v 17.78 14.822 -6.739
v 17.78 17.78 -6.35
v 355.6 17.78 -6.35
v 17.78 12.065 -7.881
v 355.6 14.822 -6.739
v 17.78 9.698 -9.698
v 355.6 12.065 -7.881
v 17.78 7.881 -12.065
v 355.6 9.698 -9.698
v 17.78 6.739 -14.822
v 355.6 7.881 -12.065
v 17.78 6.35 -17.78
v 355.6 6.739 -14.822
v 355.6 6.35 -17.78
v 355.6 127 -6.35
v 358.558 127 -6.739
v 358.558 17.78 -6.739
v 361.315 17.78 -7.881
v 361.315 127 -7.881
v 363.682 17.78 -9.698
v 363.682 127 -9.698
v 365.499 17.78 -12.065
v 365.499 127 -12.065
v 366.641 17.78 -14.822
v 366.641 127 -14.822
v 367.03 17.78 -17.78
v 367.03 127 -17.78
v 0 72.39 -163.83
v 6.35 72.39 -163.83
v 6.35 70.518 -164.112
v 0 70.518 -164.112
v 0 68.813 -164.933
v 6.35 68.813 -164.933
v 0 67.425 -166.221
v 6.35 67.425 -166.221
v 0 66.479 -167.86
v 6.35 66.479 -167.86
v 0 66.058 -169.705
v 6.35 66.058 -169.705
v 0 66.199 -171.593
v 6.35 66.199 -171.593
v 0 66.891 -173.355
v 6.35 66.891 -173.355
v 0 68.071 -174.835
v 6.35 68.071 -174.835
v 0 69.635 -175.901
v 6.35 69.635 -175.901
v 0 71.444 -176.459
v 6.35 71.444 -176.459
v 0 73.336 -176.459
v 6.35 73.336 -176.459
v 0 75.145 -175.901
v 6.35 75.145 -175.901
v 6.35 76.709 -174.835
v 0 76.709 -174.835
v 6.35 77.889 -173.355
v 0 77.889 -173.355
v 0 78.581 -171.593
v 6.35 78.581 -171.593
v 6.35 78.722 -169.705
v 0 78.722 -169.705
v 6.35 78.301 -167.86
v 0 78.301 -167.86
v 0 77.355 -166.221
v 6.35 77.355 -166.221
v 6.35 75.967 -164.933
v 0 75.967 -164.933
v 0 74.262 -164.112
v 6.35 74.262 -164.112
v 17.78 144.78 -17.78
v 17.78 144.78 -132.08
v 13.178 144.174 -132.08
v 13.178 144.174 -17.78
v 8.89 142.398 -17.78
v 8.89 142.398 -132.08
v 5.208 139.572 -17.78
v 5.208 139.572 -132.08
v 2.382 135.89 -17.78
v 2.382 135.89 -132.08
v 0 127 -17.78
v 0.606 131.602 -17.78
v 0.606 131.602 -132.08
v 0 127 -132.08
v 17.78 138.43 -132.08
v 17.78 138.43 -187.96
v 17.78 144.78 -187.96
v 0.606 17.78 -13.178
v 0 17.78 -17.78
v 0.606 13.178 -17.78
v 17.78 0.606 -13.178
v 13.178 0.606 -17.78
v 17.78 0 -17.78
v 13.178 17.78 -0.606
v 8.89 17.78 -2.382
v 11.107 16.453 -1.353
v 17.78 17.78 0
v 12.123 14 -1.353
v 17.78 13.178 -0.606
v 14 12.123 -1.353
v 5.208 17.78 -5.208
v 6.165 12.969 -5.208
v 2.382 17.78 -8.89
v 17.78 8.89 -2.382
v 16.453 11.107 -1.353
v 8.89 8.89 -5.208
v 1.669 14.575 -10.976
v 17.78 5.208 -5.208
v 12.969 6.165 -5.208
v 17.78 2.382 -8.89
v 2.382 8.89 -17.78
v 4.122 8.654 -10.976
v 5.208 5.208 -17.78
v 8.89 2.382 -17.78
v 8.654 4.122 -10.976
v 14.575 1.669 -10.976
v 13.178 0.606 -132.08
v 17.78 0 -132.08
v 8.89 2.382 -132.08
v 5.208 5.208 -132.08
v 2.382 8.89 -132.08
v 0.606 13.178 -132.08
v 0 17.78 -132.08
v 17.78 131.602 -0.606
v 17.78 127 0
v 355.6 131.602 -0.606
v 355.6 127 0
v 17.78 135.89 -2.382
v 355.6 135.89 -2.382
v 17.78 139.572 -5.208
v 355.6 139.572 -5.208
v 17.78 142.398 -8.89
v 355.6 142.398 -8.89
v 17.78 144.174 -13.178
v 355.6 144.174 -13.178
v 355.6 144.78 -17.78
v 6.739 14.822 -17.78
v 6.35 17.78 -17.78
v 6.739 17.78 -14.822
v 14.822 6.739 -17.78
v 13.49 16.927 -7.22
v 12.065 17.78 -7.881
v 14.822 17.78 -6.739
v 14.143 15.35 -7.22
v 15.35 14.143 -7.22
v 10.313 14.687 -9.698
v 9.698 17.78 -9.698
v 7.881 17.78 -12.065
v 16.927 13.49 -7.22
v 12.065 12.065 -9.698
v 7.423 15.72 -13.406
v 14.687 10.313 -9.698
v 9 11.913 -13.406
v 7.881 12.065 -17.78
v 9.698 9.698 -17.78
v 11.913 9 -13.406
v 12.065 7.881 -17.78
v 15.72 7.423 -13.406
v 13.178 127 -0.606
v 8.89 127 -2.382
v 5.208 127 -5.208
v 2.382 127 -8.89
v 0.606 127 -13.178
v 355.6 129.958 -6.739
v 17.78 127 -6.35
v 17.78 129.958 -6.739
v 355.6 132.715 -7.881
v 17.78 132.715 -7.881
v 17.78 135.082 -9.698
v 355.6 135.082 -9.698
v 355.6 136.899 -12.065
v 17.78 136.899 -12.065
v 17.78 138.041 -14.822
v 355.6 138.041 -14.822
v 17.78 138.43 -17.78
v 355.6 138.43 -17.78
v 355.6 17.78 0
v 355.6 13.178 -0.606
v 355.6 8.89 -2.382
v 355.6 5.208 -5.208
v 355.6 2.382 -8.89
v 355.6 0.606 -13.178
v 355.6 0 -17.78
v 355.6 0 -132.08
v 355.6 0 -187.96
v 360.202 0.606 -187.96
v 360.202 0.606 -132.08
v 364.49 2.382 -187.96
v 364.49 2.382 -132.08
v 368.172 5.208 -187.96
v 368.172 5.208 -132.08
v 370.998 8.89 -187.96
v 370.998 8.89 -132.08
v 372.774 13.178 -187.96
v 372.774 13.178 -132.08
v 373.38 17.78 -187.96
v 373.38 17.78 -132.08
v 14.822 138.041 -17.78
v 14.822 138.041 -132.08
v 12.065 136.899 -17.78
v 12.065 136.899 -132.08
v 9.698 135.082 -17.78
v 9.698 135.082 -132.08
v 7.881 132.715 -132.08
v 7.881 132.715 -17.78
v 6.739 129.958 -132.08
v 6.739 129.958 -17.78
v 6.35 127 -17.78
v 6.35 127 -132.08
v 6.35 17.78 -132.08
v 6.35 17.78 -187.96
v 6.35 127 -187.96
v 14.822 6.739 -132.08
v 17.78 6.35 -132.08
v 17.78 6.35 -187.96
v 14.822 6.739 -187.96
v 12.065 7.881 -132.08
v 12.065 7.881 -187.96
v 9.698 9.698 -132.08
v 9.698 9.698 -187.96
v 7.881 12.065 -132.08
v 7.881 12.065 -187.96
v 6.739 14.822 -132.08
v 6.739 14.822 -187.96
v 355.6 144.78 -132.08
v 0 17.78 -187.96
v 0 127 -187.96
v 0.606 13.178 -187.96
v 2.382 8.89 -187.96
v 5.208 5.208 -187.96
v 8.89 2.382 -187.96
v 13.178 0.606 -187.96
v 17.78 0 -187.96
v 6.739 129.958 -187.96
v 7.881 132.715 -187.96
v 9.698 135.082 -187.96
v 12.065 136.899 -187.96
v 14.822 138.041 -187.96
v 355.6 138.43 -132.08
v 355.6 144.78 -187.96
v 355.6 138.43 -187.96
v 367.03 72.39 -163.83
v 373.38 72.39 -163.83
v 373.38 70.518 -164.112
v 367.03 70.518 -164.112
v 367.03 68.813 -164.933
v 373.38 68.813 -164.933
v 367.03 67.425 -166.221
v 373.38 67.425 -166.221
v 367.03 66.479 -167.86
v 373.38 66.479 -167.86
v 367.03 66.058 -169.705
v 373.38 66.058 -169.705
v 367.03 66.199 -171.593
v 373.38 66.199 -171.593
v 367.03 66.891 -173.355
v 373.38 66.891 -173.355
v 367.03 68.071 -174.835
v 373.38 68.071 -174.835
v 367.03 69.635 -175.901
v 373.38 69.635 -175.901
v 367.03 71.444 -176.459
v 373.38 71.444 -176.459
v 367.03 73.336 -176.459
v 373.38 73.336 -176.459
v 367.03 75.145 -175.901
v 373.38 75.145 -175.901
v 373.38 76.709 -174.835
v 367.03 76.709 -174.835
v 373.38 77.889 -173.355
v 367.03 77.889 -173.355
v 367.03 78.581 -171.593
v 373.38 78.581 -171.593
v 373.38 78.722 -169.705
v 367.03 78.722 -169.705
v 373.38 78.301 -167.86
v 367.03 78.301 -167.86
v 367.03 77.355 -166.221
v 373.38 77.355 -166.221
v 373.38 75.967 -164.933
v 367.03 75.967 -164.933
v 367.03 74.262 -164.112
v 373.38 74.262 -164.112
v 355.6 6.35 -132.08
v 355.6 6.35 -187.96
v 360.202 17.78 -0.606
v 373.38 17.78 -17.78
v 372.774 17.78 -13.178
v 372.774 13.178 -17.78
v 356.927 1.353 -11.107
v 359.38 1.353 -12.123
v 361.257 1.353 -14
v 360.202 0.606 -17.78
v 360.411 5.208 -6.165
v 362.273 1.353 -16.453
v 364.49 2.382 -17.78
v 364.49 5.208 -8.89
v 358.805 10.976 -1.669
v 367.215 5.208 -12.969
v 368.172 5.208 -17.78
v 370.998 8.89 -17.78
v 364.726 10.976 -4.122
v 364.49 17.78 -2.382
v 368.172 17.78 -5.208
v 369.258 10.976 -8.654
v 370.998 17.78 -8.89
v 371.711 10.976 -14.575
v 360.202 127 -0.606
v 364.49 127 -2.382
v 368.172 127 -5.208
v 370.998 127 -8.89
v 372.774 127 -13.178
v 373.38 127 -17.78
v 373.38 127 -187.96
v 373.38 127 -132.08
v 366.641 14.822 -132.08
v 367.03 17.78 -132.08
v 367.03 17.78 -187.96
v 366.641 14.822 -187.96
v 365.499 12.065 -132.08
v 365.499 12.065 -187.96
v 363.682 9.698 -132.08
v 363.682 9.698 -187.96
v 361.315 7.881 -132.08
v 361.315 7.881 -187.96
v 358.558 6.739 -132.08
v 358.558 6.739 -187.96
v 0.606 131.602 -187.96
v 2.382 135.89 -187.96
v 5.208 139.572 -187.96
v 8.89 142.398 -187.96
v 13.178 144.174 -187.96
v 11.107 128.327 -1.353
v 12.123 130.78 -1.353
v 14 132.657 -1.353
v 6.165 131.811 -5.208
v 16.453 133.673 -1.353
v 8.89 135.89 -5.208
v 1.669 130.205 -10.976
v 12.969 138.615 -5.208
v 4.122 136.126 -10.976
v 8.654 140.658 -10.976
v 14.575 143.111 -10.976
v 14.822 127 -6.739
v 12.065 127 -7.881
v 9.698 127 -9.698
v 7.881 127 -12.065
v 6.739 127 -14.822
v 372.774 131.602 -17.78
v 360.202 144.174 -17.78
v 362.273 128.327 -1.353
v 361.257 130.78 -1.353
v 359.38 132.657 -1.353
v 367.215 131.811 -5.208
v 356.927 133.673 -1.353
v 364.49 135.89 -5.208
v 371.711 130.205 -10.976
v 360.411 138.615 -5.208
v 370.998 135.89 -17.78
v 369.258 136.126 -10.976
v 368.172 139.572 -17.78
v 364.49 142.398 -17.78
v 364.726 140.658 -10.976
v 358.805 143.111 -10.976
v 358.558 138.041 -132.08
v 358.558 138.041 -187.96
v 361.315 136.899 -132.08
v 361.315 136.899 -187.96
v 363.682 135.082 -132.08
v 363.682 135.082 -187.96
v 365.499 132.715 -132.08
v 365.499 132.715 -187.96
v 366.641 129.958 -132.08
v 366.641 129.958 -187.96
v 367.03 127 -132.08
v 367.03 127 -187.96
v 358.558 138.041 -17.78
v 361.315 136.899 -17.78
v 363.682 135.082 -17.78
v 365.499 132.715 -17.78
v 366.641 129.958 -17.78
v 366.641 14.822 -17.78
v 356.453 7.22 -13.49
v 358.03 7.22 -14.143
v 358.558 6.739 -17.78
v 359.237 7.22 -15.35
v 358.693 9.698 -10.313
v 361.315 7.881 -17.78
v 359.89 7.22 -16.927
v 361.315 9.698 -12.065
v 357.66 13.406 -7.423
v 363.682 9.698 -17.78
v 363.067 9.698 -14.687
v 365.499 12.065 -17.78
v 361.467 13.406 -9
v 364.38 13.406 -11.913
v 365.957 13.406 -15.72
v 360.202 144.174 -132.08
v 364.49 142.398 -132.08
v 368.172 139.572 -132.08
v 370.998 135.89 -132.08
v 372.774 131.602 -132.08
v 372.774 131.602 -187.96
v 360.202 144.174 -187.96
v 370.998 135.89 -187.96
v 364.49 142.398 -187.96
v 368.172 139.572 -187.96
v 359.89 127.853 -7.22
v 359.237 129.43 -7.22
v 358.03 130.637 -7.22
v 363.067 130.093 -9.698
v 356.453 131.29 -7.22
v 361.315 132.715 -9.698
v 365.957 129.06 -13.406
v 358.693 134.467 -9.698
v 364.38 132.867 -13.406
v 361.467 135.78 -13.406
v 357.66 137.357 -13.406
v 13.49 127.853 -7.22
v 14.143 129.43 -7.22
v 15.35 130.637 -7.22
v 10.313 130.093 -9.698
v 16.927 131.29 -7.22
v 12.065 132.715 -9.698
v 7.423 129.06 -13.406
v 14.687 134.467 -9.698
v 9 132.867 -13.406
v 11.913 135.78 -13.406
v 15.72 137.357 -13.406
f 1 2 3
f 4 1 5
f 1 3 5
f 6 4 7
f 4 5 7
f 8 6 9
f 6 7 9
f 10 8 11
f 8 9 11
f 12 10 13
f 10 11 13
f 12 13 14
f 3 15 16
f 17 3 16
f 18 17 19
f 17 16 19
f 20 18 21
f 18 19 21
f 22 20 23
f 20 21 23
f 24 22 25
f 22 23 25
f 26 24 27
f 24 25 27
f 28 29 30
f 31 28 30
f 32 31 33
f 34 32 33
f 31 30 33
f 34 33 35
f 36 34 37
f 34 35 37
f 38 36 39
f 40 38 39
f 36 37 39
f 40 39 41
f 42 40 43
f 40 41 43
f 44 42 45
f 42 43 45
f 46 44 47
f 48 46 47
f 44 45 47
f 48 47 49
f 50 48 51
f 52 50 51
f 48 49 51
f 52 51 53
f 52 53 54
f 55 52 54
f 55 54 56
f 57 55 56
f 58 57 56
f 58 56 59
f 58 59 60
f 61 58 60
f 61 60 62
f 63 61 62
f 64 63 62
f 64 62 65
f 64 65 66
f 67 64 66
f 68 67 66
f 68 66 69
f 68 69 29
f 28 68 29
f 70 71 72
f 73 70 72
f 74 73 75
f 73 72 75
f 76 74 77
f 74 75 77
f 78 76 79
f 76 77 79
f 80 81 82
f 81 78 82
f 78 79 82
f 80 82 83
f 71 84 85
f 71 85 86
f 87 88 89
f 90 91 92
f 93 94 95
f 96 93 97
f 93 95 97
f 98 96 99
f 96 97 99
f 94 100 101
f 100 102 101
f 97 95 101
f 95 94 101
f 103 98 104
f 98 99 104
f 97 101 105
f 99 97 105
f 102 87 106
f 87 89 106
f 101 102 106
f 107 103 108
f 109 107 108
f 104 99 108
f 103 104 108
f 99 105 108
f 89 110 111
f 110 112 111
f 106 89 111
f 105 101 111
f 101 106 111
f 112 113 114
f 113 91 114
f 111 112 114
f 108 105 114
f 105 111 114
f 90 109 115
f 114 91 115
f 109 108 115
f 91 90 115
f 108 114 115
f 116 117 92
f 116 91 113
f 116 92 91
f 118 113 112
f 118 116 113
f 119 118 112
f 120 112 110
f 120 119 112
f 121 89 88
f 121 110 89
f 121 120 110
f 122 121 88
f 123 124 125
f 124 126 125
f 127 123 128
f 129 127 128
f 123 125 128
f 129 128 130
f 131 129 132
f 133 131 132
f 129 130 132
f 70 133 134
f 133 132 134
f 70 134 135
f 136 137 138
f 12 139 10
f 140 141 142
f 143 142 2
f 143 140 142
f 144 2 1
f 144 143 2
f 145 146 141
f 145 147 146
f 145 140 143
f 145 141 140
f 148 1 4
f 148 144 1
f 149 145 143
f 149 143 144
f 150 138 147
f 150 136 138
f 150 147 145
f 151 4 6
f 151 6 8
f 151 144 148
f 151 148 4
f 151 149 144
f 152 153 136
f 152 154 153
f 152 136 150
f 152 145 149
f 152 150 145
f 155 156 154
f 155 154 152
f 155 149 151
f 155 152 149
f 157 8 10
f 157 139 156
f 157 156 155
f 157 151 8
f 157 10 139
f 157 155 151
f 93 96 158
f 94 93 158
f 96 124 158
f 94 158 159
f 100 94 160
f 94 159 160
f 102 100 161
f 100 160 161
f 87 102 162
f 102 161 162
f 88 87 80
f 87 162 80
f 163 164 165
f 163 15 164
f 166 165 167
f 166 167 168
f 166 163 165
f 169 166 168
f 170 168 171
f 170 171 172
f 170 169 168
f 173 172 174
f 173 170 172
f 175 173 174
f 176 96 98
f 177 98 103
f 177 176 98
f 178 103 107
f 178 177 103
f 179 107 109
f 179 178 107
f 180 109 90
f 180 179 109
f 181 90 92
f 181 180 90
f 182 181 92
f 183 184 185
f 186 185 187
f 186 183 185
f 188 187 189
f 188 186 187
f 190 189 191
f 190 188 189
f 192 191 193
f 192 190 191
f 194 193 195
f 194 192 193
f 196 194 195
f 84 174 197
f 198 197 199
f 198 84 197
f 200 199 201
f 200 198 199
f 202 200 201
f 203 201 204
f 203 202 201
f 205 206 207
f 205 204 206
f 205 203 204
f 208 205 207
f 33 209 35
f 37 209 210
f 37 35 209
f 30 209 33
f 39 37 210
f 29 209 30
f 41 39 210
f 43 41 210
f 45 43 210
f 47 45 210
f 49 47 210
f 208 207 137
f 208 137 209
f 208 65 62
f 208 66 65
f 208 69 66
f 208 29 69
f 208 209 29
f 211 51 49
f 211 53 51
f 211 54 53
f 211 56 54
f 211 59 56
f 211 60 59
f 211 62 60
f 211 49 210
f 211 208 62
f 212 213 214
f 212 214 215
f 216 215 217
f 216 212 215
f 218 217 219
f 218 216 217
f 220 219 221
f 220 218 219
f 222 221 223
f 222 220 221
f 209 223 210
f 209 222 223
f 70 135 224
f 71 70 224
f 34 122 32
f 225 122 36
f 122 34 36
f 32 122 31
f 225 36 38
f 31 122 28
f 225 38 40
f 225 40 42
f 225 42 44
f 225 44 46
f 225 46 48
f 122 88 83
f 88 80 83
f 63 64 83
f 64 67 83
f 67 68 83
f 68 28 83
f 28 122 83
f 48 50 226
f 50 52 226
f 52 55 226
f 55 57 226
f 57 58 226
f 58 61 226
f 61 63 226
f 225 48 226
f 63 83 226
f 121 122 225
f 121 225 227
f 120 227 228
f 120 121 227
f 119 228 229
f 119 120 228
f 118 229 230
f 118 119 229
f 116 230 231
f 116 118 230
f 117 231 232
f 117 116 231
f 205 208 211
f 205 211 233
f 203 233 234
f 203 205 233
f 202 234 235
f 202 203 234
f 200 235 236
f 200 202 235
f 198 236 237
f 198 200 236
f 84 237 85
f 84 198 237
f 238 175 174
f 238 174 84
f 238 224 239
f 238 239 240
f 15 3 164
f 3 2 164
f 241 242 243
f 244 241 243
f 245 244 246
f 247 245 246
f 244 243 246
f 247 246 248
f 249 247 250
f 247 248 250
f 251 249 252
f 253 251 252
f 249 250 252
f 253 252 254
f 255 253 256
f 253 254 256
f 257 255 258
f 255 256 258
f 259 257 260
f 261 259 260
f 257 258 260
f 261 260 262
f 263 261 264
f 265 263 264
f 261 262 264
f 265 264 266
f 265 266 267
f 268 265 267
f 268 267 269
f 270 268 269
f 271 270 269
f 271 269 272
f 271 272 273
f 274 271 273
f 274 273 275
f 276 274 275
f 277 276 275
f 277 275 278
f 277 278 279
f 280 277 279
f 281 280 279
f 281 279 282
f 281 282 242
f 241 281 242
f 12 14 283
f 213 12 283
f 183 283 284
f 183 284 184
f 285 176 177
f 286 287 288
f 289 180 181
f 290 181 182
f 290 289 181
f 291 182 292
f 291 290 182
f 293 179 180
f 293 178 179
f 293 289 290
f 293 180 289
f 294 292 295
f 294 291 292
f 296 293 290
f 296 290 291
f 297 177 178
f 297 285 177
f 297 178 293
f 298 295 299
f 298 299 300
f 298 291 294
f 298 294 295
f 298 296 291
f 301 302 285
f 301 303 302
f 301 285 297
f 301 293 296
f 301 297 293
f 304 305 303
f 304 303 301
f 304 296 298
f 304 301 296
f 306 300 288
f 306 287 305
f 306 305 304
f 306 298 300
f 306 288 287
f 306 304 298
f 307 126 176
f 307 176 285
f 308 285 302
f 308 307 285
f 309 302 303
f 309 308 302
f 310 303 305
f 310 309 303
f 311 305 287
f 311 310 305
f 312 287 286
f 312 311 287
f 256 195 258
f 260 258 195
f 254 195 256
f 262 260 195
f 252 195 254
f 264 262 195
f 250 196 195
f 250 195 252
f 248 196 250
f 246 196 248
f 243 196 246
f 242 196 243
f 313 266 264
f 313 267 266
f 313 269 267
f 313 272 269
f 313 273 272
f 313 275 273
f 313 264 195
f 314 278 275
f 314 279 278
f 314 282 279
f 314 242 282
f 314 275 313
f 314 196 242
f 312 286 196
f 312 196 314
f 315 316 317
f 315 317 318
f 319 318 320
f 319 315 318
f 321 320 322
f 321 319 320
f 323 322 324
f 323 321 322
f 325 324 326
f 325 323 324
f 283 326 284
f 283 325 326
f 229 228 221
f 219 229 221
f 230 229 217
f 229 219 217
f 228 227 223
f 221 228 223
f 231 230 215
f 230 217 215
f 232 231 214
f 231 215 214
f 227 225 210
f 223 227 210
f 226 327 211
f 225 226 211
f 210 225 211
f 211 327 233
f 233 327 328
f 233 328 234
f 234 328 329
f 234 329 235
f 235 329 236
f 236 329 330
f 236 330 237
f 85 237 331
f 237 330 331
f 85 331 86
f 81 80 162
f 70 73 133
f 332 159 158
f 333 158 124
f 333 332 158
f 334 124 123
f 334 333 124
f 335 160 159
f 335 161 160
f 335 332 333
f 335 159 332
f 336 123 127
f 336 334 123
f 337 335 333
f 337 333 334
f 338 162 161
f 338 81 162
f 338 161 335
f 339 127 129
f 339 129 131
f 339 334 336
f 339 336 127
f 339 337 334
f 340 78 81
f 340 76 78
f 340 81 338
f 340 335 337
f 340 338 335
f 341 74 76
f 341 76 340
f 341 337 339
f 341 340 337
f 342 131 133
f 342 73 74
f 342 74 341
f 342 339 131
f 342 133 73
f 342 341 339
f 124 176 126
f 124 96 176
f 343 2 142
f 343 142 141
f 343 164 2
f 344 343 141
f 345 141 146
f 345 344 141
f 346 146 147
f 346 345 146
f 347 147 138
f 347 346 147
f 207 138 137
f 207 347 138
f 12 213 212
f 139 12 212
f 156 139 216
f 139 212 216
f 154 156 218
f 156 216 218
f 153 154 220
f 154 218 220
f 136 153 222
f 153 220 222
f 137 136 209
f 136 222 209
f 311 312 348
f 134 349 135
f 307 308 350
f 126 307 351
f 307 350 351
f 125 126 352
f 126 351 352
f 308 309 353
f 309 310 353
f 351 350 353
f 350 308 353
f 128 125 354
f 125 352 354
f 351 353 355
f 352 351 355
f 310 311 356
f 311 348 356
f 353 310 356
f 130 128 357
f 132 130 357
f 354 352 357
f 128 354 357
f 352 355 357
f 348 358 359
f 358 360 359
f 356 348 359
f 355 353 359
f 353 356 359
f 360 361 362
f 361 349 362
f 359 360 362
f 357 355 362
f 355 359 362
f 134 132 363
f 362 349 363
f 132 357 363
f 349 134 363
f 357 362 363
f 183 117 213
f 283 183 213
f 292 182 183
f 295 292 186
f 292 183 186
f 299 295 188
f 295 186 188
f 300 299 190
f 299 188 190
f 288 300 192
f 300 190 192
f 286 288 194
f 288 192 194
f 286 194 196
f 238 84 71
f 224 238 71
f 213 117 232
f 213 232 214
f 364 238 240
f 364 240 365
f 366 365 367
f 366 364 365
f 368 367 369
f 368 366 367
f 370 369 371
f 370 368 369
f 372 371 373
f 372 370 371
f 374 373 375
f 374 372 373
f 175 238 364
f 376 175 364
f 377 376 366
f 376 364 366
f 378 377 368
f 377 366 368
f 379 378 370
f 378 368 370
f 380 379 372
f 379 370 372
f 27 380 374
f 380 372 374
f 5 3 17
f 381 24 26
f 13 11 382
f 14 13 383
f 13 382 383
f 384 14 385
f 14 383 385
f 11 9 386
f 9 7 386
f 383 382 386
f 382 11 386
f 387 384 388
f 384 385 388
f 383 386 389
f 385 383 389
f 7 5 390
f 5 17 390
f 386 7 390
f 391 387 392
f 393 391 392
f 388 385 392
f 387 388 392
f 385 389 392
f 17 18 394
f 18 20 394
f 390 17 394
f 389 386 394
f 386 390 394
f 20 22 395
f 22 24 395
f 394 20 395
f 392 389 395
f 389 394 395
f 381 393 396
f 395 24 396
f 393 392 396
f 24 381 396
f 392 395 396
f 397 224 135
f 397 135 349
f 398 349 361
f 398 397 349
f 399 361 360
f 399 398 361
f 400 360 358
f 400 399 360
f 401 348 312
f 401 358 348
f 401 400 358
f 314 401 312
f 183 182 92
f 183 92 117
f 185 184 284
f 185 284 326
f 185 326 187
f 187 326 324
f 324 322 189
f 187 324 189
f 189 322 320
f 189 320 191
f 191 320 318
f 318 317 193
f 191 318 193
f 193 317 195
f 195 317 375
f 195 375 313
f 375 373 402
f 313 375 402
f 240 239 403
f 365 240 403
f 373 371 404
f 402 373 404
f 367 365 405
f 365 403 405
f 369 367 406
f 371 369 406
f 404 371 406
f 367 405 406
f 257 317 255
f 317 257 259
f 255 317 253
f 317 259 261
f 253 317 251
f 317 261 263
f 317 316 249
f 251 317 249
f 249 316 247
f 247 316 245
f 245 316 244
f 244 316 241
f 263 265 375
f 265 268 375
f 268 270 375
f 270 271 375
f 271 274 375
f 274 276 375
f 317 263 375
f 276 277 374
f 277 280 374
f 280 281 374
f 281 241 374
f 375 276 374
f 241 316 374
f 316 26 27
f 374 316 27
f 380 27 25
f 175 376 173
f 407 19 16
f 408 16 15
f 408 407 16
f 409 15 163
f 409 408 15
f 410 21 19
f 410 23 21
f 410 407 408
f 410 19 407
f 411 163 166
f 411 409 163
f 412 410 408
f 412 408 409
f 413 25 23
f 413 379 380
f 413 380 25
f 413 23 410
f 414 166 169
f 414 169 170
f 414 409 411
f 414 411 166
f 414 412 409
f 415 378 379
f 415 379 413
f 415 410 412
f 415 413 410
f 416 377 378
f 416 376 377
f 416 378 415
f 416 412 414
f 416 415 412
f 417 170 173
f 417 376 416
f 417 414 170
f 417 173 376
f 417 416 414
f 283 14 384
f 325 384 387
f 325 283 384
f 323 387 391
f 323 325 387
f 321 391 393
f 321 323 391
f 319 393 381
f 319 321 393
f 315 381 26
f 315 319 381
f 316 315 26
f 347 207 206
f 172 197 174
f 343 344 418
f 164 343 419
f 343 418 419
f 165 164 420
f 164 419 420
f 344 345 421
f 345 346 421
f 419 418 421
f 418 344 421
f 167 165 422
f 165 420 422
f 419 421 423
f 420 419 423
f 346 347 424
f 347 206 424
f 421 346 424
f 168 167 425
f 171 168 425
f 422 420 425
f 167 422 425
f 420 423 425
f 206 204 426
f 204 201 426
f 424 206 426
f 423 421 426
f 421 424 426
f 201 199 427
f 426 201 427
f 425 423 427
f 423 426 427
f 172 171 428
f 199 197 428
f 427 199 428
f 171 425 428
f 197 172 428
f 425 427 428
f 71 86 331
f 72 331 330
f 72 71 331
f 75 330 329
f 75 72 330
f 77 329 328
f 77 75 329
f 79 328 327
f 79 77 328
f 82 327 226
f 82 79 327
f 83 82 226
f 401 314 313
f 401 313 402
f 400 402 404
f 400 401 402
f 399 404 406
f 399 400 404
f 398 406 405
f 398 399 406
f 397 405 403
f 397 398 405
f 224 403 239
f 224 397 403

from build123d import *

# Parameters (mm, degrees)
SKETCH1_W           = 132.08
SKETCH1_H           = 144.78
BOSS_EXTRUDE1_DEPTH = 373.38
FILLET1_R           = 17.78
SHELL1_T            = -6.35
SKETCH2_W           = 6.35
SKETCH2_H           = 109.22
BOSS_EXTRUDE2_DEPTH = 55.88
SKETCH3_R           = 6.35
CUT_EXTRUDE1_DEPTH  = 383.54


with BuildPart() as part:
    # Sketch1 → Boss-Extrude1 (new body)
    with BuildSketch(Plane(origin=(0, 0, 0), x_dir=(0, 0, -1), z_dir=(1, 0, 0))):
        with Locations((66.04, 72.39)):
            Rectangle(SKETCH1_W, SKETCH1_H)
    extrude(amount=BOSS_EXTRUDE1_DEPTH)

    # Fillet1
    fillet1_edges = [part.edges().sort_by_distance(p)[0] for p in [
        (373.38, 144.78, -66.04),
        (373.38, 72.39, 0),
        (0, 144.78, -66.04),
        (0, 0, -66.04),
        (0, 72.39, 0),
        (186.69, 144.78, 0),
        (186.69, 0, 0),
        (373.38, 0, -66.04),
    ]]
    fillet(fillet1_edges, radius=FILLET1_R)

    # Shell1
    shell1_openings = [part.faces().sort_by_distance(p)[0] for p in [
        (186.69, 72.39, -132.08),
    ]]
    offset(amount=SHELL1_T, openings=shell1_openings, kind=Kind.INTERSECTION)

    # Sketch2 → Boss-Extrude2 (add)
    with BuildSketch(Plane(origin=(0, 0, -132.08), x_dir=(-1, 0, 0), z_dir=(0, 0, -1))):
        with BuildLine():
            Line((-355.6, 144.78), (-355.6, 138.43))
            ThreePointArc((-355.6, 138.43), (-363.682230509, 135.082230509), (-367.03, 127))
            Line((-367.03, 127), (-373.38, 127))
            ThreePointArc((-373.38, 127), (-368.172358569, 139.572358569), (-355.6, 144.78))
        make_face()
        with Locations((-370.205, 72.39)):
            Rectangle(SKETCH2_W, SKETCH2_H)
        with BuildLine():
            Line((-355.6, 6.35), (-355.6, 0))
            ThreePointArc((-355.6, 0), (-368.172358569, 5.207641431), (-373.38, 17.78))
            Line((-373.38, 17.78), (-367.03, 17.78))
            ThreePointArc((-367.03, 17.78), (-363.682230509, 9.697769491), (-355.6, 6.35))
        make_face()
        with BuildLine():
            Line((-17.78, 138.43), (-17.78, 144.78))
            ThreePointArc((-17.78, 144.78), (-5.207641431, 139.572358569), (0, 127))
            Line((0, 127), (-6.35, 127))
            ThreePointArc((-6.35, 127), (-9.697769491, 135.082230509), (-17.78, 138.43))
        make_face()
        with Locations((-3.175, 72.39)):
            Rectangle(SKETCH2_W, SKETCH2_H)
        with BuildLine():
            Line((-6.35, 17.78), (0, 17.78))
            ThreePointArc((0, 17.78), (-5.207641431, 5.207641431), (-17.78, 0))
            Line((-17.78, 0), (-17.78, 6.35))
            ThreePointArc((-17.78, 6.35), (-9.697769491, 9.697769491), (-6.35, 17.78))
        make_face()
    extrude(amount=BOSS_EXTRUDE2_DEPTH)

    # Sketch3 → Cut-Extrude1 (cut)
    with BuildSketch(Plane(origin=(373.38, 0, 0), x_dir=(0, 0, -1), z_dir=(1, 0, 0))):
        with Locations(Location((170.18, 72.39, 0), (0, 0, 180))):
            Circle(SKETCH3_R)
    extrude(amount=-CUT_EXTRUDE1_DEPTH, mode=Mode.SUBTRACT)


solid = part.part
